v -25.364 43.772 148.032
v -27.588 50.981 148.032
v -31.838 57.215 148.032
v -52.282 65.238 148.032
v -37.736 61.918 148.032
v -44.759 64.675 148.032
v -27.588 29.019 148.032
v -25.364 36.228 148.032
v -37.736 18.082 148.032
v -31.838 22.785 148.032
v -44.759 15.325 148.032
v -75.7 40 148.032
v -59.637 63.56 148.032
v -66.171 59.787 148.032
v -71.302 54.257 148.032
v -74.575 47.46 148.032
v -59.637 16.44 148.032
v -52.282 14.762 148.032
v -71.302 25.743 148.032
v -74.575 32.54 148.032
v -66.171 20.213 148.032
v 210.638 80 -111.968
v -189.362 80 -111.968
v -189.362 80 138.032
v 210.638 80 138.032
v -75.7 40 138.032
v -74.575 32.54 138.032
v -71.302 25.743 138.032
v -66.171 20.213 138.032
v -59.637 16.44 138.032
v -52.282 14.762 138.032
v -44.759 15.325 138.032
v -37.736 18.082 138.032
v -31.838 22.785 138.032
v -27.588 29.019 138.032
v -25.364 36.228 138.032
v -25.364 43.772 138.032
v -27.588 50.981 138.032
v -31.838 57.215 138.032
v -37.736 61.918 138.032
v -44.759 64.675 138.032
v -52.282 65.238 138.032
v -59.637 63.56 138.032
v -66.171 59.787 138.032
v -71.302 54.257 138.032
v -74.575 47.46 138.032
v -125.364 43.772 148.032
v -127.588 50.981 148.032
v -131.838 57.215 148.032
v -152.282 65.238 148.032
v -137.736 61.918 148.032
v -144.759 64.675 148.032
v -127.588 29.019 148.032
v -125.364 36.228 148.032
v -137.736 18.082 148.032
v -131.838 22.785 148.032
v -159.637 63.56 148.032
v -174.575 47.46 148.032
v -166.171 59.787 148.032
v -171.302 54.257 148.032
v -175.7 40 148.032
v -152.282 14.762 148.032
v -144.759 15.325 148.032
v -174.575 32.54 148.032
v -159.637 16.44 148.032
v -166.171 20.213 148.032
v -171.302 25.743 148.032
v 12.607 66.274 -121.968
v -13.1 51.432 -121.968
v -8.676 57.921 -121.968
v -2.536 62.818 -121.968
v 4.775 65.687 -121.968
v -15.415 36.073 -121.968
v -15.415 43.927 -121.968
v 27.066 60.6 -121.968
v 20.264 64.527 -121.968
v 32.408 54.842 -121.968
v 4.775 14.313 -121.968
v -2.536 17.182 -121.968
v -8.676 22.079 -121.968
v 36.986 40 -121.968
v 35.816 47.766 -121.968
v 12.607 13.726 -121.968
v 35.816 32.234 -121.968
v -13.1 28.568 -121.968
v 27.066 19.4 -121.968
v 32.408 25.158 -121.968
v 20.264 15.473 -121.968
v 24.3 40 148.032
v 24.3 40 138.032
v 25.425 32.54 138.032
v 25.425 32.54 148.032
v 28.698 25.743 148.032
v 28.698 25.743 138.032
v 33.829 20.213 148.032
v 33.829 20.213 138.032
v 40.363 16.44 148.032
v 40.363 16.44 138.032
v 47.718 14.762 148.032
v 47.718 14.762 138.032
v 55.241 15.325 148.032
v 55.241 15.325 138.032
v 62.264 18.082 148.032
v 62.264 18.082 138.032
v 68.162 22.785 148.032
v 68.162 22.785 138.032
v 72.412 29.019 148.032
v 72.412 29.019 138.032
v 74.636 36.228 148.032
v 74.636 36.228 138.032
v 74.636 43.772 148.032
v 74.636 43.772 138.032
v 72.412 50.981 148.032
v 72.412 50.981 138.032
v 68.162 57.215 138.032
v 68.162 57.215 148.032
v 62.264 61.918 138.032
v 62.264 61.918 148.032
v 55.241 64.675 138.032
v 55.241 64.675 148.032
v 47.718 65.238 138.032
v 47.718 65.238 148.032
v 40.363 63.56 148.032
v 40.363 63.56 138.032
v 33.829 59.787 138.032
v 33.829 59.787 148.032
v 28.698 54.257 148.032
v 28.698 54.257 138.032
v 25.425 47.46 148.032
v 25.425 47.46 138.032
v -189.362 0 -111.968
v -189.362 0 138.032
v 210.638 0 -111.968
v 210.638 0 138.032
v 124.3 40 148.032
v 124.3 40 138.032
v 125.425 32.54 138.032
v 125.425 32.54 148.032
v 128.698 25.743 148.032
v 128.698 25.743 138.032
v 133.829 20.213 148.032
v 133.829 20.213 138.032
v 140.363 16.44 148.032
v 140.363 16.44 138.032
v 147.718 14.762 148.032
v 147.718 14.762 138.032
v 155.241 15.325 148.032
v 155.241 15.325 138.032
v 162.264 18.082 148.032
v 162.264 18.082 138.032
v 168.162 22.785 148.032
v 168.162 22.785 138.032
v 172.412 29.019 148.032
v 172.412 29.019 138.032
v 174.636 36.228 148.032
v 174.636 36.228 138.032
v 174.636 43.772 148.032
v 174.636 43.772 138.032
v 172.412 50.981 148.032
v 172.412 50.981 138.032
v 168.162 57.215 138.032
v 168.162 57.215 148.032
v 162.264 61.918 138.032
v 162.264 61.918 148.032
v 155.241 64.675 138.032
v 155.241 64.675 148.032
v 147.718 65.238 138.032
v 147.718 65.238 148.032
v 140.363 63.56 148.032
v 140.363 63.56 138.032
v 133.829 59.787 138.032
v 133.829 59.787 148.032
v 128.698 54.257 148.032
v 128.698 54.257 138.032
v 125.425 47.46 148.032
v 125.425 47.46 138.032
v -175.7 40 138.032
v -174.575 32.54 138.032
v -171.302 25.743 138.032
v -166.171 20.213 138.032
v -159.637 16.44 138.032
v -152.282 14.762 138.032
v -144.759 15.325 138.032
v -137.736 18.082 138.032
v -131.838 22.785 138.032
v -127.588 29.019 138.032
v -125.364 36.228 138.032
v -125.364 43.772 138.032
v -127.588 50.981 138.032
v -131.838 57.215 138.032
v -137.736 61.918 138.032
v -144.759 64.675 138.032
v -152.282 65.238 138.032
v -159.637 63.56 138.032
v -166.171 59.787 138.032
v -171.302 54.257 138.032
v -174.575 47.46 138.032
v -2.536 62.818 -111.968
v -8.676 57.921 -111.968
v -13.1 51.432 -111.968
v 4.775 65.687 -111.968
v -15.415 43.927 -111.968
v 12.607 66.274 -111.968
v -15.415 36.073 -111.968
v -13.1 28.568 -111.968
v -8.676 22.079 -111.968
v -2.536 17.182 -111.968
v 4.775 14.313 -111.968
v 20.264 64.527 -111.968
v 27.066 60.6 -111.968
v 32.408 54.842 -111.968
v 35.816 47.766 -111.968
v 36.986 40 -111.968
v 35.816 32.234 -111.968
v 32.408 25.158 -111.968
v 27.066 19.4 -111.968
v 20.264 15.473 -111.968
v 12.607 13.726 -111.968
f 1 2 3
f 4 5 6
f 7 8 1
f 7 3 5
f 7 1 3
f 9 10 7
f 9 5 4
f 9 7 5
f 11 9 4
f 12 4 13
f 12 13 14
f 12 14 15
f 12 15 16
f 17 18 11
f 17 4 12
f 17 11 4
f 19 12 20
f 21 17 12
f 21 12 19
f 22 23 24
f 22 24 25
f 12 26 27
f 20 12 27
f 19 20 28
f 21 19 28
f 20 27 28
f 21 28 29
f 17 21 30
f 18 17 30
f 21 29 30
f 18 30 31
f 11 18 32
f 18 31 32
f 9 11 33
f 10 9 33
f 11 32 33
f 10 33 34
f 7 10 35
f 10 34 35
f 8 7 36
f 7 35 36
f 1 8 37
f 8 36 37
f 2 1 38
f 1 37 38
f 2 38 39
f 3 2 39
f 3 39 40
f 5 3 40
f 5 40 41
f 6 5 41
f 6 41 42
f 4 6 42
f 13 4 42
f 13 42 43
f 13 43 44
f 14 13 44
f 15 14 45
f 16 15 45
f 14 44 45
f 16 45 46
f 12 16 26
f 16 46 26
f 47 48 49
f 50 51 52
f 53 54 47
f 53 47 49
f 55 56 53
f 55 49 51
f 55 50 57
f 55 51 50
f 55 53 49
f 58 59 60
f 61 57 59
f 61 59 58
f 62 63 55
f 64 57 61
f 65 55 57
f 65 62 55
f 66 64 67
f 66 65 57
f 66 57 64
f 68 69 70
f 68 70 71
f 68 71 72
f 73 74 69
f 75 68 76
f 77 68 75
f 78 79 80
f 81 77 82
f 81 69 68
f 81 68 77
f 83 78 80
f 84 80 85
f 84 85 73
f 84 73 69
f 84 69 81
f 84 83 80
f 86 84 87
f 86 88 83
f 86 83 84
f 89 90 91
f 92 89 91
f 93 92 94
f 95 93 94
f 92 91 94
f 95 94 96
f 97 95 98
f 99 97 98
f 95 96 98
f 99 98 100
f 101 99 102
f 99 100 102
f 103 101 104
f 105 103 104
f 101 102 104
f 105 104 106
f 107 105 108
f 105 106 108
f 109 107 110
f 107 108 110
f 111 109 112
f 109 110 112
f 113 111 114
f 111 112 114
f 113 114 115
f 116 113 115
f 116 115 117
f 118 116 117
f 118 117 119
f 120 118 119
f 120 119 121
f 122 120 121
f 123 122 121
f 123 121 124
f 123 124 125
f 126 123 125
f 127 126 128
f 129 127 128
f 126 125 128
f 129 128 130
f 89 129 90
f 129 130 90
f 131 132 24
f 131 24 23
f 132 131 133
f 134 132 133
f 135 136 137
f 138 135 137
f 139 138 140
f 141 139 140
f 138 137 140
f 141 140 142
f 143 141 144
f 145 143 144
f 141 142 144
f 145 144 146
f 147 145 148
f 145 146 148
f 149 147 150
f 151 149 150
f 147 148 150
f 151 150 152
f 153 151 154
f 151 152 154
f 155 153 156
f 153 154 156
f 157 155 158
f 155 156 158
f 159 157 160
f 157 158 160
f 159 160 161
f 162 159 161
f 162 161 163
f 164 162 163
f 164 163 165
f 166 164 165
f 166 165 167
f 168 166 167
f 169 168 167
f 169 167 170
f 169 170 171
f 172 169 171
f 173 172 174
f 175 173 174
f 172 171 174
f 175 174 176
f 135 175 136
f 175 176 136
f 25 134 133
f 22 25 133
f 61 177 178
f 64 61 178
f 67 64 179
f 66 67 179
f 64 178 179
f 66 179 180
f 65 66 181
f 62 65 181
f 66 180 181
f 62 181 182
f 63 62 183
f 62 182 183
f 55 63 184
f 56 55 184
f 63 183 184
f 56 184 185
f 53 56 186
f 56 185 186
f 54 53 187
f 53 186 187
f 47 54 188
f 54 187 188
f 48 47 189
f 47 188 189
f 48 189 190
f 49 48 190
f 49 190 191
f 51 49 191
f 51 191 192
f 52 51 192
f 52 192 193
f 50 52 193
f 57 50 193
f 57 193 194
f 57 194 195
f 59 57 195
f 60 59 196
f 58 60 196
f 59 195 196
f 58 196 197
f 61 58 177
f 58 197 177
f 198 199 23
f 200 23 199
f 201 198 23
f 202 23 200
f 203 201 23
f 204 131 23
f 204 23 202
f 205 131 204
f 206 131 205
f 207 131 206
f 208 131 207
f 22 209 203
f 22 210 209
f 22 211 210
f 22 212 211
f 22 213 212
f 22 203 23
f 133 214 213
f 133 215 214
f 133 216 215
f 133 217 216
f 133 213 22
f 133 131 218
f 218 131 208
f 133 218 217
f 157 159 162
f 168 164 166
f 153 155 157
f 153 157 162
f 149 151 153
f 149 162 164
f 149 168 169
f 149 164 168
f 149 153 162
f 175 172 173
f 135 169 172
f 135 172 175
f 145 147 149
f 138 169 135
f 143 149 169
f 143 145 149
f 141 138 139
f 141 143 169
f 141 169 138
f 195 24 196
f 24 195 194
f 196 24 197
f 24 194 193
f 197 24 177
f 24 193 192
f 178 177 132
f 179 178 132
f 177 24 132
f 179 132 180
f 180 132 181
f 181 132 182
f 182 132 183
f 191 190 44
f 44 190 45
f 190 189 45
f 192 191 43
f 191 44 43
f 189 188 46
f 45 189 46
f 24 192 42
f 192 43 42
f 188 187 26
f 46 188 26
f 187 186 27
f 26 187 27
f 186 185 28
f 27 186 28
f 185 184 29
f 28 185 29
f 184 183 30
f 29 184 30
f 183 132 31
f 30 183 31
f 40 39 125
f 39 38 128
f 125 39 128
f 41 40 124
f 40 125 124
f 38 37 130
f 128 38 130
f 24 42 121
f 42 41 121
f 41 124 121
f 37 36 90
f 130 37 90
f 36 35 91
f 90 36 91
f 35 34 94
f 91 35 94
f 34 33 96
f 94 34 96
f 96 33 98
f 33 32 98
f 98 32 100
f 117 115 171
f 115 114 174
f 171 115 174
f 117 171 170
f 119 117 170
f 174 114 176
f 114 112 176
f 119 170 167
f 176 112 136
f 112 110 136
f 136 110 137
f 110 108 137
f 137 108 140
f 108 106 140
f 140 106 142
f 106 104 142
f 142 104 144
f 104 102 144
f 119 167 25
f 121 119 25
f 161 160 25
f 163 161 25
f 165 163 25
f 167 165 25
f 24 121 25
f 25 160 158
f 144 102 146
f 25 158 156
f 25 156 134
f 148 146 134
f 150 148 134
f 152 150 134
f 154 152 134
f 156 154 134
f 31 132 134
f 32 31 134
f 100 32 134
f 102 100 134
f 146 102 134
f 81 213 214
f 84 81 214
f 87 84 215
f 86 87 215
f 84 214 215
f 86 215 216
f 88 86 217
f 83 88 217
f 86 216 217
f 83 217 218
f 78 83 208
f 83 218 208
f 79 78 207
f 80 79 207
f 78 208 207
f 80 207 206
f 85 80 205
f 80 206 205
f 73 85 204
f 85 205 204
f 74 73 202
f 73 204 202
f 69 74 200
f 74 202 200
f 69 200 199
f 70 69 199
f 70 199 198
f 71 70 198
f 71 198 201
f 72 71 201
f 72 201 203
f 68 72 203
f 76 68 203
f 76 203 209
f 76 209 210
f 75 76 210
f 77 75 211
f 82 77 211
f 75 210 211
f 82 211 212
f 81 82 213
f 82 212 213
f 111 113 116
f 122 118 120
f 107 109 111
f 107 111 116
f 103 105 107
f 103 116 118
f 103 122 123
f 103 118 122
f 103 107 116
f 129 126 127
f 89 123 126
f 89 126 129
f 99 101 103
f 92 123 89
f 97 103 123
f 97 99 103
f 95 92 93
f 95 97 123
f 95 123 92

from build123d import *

# Parameters (mm, degrees)
SKETCH_1_W      = 400
SKETCH_1_H      = 250
EXTRUDE_1_DEPTH = 80
SKETCH_3_R      = 26.348031195
EXTRUDE_2_DEPTH = 10
SKETCH_2_R      = 25.309072204
EXTRUDE_3_DEPTH = 10


with BuildPart() as part:
    # 草图1 → 凸台-拉伸1 (new body)
    with BuildSketch(Plane(origin=(0, 0, 0), x_dir=(1, 0, 0), z_dir=(0, 1, 0))):
        with Locations((10.638297872, -13.031914894)):
            Rectangle(SKETCH_1_W, SKETCH_1_H)
    extrude(amount=EXTRUDE_1_DEPTH)

    # 草图3 → 凸台-拉伸2 (add)
    with BuildSketch(Plane(origin=(0, 0, -111.968085106), x_dir=(-1, 0, 0), z_dir=(0, 0, -1))):
        with Locations(Location((-10.638297872, 40, 0), (0, 0, 180))):
            Circle(SKETCH_3_R)
    extrude(amount=EXTRUDE_2_DEPTH)

    # 草图2 → 凸台-拉伸3 (add)
    with BuildSketch(Plane.XY.offset(138.031914894)):
        with Locations(Location((-150.390563376, 40, 0), (0, 0, 180))):
            Circle(SKETCH_2_R)
        with Locations(Location((-50.390563376, 40, 0), (0, 0, 180))):
            Circle(SKETCH_2_R)
        with Locations(Location((49.609436624, 40, 0), (0, 0, 180))):
            Circle(SKETCH_2_R)
        with Locations(Location((149.609436624, 40, 0), (0, 0, 180))):
            Circle(SKETCH_2_R)
    extrude(amount=EXTRUDE_3_DEPTH)


solid = part.part
